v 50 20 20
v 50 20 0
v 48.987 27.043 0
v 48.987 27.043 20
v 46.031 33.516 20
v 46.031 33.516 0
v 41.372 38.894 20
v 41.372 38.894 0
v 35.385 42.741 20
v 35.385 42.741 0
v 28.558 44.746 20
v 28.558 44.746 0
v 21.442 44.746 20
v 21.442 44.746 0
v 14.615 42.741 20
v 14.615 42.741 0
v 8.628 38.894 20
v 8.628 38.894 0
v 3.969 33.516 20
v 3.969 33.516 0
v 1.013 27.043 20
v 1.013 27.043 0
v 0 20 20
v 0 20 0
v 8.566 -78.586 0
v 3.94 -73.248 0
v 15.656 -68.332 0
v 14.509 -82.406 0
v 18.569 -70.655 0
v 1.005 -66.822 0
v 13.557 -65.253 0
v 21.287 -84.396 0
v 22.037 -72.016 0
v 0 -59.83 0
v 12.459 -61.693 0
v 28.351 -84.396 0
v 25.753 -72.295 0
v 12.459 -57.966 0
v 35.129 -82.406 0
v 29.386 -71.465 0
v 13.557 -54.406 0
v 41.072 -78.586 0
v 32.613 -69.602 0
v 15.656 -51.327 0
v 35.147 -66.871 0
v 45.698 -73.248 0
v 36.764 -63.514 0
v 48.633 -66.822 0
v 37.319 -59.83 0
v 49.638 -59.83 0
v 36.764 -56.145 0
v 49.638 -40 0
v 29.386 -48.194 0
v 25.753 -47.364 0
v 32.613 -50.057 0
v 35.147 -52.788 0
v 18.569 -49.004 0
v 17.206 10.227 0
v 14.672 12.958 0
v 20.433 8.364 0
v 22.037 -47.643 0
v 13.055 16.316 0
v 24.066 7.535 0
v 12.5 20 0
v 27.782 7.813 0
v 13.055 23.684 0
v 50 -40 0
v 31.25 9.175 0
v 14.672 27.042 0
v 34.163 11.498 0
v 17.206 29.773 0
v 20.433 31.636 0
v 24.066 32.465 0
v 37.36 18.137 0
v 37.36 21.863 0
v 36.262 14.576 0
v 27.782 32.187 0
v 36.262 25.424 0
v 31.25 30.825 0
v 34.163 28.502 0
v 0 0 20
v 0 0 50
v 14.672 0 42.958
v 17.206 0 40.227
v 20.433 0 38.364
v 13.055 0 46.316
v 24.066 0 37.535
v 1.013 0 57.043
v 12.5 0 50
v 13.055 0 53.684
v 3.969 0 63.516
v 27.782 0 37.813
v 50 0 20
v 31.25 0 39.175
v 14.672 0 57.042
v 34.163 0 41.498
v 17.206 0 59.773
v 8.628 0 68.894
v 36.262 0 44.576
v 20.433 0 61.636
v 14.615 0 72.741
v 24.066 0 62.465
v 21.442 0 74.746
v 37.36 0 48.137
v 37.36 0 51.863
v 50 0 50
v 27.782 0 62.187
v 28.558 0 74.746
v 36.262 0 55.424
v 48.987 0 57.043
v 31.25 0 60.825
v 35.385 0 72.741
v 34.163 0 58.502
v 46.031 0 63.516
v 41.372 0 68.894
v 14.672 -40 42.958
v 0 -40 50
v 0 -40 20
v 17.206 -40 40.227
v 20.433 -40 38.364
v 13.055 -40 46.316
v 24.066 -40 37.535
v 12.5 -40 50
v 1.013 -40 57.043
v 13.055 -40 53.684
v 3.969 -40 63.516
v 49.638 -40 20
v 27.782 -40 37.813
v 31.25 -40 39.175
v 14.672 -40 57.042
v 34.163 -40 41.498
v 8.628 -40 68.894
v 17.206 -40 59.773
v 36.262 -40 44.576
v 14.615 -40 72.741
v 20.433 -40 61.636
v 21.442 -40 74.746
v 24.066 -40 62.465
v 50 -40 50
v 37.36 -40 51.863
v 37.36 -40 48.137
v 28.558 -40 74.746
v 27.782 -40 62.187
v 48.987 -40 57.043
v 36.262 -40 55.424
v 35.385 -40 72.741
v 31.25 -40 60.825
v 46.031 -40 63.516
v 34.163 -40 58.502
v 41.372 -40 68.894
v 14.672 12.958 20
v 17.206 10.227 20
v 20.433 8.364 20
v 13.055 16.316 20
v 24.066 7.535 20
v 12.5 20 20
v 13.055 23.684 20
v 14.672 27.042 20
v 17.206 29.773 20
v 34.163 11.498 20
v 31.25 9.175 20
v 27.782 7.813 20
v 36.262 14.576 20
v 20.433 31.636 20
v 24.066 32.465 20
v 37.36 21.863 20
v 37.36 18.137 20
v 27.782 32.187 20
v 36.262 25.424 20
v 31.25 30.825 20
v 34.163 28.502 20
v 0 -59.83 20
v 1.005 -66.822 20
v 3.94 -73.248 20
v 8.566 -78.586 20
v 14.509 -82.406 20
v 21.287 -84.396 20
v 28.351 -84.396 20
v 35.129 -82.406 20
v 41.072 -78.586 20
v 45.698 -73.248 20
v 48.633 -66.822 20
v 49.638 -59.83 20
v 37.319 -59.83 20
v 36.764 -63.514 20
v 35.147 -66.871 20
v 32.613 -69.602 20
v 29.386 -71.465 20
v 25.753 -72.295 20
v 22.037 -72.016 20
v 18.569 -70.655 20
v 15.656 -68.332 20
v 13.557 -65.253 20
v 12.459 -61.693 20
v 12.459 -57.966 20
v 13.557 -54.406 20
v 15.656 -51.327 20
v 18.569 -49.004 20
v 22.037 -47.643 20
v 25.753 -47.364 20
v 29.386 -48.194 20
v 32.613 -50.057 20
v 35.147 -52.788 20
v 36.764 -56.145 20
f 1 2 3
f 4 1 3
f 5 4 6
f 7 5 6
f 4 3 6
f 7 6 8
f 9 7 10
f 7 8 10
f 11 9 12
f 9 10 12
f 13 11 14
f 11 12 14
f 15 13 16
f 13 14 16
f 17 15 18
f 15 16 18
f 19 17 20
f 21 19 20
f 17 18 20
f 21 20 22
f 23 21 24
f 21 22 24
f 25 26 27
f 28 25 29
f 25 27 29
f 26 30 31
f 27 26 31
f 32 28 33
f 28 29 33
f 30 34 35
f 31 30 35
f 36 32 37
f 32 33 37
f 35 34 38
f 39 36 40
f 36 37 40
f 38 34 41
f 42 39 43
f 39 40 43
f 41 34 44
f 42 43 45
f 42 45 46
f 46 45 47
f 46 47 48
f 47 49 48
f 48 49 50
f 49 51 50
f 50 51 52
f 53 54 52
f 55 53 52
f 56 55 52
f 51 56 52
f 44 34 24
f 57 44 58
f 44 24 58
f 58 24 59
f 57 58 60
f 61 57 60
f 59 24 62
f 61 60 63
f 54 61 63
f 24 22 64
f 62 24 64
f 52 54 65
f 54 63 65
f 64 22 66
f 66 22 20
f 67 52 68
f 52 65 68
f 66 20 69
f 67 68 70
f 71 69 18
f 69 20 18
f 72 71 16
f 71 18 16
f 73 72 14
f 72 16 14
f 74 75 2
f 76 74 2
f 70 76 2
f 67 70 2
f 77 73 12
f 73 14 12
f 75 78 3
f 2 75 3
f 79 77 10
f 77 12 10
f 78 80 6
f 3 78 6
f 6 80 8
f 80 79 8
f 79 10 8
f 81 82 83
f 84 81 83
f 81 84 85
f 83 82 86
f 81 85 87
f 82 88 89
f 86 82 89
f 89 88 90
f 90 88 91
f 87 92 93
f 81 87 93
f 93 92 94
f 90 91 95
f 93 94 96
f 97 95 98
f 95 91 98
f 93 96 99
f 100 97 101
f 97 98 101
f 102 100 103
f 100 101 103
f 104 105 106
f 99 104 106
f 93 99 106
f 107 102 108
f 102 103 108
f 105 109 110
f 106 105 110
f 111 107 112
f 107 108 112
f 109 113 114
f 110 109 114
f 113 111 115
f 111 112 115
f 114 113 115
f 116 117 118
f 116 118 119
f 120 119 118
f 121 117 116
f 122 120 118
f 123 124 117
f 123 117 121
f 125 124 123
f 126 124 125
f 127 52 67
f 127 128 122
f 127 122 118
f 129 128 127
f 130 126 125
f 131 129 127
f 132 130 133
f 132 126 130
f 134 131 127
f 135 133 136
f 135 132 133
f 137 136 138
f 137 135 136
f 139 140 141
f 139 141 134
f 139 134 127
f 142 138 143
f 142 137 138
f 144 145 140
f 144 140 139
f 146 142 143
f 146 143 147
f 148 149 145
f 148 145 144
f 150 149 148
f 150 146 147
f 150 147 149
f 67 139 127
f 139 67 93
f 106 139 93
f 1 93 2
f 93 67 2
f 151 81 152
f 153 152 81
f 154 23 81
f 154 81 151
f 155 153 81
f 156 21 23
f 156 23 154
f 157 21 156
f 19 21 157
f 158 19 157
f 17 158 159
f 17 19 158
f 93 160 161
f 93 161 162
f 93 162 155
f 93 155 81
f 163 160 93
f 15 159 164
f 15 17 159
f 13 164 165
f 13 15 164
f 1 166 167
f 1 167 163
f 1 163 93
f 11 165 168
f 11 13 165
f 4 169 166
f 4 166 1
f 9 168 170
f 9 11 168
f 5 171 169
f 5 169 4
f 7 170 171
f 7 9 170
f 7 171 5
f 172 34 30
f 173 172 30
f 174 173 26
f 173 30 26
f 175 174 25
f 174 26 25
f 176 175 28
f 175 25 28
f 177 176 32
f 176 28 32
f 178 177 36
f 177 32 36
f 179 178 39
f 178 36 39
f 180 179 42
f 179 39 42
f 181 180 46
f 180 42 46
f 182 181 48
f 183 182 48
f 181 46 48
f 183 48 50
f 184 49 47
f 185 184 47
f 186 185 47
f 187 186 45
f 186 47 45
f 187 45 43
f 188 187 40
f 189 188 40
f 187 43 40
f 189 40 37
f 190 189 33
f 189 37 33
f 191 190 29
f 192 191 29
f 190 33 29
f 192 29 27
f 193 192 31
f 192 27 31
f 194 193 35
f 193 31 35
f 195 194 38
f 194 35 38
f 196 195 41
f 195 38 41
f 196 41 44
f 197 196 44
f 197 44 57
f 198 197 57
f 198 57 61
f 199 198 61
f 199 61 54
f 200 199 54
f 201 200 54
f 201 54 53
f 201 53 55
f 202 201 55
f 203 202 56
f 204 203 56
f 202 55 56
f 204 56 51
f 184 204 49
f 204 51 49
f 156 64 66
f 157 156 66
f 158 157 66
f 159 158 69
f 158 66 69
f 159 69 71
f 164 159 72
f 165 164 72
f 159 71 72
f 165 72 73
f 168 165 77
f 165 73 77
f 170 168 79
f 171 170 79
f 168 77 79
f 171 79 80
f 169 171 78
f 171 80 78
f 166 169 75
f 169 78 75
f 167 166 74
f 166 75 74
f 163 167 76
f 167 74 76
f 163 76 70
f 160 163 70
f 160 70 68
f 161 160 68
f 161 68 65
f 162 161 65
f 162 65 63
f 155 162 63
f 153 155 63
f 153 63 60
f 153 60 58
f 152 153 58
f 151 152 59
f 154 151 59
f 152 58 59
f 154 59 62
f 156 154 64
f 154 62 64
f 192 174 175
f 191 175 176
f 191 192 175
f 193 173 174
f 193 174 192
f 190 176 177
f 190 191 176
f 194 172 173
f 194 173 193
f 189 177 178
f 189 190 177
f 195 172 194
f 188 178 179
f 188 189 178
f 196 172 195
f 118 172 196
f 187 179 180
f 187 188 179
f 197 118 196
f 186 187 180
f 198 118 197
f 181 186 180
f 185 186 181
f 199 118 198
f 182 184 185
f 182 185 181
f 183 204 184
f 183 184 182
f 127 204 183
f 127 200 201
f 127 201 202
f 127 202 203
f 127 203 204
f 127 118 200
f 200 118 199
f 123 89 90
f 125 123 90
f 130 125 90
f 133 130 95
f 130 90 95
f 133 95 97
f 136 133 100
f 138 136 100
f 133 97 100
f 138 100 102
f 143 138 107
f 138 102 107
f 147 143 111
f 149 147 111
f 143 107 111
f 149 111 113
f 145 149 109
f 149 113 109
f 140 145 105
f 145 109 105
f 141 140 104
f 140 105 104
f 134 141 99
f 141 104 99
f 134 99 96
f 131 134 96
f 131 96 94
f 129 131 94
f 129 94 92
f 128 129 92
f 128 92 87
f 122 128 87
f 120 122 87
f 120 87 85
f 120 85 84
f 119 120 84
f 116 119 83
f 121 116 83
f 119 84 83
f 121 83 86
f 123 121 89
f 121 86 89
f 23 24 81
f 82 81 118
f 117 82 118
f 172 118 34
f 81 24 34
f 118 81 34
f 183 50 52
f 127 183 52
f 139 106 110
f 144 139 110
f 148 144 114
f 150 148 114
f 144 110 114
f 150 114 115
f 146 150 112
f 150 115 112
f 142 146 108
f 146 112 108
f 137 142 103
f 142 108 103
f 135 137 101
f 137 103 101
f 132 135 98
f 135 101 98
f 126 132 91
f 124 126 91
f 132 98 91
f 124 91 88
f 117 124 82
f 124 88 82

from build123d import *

# Parameters (mm, degrees)
F1_DEPTH = 40
F3_DEPTH = 20
F5_DEPTH = 20


with BuildPart() as f1:
    # F0 (on Front) → F1 (new body)
    with BuildSketch(Plane.XZ):
        with BuildLine():
            Line((0, 50), (0, 0))
            Line((0, 0), (50, 0))
            Line((50, 0), (50, 50))
            Line((50, 50), (37.5, 50))
            ThreePointArc((37.5, 50), (25, 37.5), (12.5, 50))
            Line((12.5, 50), (0, 50))
        make_face()
        with BuildLine():
            ThreePointArc((50, 50), (25, 75), (0, 50))
            Line((0, 50), (12.5, 50))
            ThreePointArc((12.5, 50), (25, 62.5), (37.5, 50))
            Line((37.5, 50), (50, 50))
        make_face()
    extrude(amount=F1_DEPTH)

    # F2 (on Top) → F3 (join)
    with BuildSketch(Plane.XY):
        with BuildLine():
            Line((0, 20), (0, 0))
            Line((0, 0), (50, 0))
            Line((50, 0), (50, 20))
            Line((50, 20), (37.5, 20))
            ThreePointArc((37.5, 20), (25, 7.5), (12.5, 20))
            Line((12.5, 20), (0, 20))
        make_face()
        with BuildLine():
            ThreePointArc((50, 20), (25, 45), (0, 20))
            Line((0, 20), (12.5, 20))
            ThreePointArc((12.5, 20), (25, 32.5), (37.5, 20))
            Line((37.5, 20), (50, 20))
        make_face()
    extrude(amount=F3_DEPTH)

    # F4 (on Top) → F5 (join)
    with BuildSketch(Plane.XY):
        with BuildLine():
            Line((49.637856, -39.829515), (0, -39.829515))
            Line((0, -39.829515), (0, -59.829515))
            Line((0, -59.829515), (12.318928, -59.829515))
            ThreePointArc((12.318928, -59.829515), (24.818928, -47.329515), (37.318928, -59.829515))
            Line((37.318928, -59.829515), (49.637856, -59.829515))
            Line((49.637856, -59.829515), (49.637856, -39.829515))
        make_face()
        with BuildLine():
            Line((12.318928, -59.829515), (0, -59.829515))
            ThreePointArc((0, -59.829515), (24.818928, -84.648443), (49.637856, -59.829515))
            Line((49.637856, -59.829515), (37.318928, -59.829515))
            ThreePointArc((37.318928, -59.829515), (24.818928, -72.329515), (12.318928, -59.829515))
        make_face()
    extrude(amount=F5_DEPTH)


solid = f1.part
